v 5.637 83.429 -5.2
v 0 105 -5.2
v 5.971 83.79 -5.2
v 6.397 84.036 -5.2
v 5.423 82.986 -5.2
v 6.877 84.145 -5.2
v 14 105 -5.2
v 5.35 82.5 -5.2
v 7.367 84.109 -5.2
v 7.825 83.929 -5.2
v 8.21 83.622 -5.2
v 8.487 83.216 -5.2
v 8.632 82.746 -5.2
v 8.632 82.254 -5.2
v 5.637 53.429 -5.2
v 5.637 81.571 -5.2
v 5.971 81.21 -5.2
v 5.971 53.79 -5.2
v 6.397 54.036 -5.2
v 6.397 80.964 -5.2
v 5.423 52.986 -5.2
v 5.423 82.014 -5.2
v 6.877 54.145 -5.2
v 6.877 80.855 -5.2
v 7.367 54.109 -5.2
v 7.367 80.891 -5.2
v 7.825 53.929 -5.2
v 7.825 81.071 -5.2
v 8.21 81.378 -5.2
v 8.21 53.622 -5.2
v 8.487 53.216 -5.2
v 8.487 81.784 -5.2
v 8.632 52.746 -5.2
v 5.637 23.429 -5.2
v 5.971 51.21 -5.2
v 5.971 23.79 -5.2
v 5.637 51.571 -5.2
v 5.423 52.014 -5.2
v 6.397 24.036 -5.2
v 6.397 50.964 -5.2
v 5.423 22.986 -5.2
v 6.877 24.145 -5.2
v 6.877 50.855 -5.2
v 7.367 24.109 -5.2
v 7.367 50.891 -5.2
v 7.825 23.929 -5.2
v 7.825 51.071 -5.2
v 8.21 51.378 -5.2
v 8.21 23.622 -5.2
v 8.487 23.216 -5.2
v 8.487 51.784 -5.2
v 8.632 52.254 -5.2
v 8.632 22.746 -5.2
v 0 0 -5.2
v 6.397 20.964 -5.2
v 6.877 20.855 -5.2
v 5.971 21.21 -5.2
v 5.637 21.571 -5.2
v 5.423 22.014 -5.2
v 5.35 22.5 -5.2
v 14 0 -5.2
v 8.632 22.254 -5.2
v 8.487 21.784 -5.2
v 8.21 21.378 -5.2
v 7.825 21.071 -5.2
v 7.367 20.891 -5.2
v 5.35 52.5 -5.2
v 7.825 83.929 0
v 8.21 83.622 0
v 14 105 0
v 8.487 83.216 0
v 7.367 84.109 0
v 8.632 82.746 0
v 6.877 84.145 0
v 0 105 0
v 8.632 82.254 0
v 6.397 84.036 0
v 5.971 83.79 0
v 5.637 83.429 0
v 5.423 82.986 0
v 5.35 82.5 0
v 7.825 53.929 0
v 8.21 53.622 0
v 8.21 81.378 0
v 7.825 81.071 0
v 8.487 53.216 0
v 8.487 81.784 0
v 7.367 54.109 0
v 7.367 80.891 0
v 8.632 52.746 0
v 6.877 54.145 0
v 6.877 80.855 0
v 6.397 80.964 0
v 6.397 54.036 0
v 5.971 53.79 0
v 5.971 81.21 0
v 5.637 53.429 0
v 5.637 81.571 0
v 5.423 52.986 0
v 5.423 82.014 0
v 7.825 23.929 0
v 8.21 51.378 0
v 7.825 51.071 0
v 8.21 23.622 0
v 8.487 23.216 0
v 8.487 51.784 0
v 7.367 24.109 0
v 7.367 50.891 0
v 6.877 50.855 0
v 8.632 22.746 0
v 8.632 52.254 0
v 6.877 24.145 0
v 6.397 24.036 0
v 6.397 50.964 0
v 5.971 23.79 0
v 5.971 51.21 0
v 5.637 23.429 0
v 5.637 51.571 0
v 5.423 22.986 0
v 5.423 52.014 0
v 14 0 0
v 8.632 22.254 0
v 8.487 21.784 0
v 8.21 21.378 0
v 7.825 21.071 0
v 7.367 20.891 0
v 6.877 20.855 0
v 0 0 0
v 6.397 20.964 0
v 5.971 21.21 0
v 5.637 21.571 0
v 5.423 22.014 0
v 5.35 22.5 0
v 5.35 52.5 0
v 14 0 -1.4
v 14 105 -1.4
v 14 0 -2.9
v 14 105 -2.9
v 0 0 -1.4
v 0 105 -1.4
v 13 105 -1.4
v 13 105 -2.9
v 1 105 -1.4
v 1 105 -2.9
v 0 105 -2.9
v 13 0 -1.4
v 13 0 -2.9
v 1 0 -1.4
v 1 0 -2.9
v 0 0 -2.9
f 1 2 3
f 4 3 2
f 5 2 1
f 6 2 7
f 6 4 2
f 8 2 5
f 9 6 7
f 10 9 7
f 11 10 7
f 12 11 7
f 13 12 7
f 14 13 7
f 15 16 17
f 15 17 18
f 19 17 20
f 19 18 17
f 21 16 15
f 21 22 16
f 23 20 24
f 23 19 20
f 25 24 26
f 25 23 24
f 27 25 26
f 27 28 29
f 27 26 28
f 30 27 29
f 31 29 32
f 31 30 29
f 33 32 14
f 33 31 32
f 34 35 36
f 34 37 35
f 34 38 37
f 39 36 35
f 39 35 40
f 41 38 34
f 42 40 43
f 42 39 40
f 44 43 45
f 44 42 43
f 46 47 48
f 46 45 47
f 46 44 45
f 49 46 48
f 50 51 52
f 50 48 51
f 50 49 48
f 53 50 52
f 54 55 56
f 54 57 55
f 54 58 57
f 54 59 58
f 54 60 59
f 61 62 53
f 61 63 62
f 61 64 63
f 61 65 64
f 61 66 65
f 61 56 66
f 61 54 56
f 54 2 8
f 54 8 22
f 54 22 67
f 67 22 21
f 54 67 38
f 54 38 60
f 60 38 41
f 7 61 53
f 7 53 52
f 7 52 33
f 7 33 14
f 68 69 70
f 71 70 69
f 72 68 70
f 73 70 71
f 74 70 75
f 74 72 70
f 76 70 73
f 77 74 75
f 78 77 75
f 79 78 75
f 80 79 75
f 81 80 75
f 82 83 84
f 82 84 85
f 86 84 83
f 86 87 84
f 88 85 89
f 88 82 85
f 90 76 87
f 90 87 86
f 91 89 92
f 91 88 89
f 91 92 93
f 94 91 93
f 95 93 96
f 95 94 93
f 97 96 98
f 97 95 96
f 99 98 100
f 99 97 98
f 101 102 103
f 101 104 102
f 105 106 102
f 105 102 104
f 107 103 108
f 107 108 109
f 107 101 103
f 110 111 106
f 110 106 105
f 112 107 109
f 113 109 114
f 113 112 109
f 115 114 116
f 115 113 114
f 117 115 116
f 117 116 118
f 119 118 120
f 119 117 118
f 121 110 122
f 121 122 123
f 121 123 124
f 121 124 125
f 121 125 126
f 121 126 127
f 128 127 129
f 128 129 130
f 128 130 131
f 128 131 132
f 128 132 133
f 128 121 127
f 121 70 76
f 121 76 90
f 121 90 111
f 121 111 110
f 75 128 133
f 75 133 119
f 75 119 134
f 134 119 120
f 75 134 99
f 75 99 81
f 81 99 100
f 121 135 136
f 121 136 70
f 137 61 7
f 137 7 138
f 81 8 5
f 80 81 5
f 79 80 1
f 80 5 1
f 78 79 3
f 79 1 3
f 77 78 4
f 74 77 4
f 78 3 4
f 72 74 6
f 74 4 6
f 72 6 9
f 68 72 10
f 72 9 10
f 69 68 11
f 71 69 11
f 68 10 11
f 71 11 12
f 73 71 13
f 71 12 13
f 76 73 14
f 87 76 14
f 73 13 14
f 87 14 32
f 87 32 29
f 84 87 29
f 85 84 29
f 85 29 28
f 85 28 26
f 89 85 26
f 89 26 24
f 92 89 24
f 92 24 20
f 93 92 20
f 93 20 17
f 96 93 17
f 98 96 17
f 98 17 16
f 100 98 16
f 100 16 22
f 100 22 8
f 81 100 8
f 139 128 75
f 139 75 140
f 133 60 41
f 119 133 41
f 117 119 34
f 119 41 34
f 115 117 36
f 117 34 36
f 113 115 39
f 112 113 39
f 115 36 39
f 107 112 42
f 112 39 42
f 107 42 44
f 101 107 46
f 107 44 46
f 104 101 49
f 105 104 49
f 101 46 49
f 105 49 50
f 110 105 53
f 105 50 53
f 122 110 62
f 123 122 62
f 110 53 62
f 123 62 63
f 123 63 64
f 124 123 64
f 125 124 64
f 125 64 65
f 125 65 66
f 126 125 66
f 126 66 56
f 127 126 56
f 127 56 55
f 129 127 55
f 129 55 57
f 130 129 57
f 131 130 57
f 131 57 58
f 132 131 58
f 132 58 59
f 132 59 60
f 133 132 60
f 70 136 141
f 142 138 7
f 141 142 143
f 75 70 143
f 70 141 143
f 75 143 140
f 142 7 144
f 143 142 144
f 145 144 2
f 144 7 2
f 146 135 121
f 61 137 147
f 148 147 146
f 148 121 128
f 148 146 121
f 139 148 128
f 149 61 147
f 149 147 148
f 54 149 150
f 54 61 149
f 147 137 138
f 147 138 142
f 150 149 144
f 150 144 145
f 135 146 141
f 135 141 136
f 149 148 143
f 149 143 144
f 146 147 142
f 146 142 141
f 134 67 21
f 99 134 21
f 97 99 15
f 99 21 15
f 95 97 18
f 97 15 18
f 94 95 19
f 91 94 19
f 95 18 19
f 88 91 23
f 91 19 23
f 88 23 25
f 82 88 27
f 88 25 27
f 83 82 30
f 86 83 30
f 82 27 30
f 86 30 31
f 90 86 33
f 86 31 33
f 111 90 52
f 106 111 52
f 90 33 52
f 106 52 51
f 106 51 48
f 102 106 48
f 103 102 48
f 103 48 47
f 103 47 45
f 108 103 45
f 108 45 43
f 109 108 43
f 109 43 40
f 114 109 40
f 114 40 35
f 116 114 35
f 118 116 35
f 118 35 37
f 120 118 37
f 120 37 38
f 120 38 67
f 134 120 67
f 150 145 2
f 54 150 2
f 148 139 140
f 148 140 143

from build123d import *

# Parameters (mm, degrees)
EXTRUDE_1_DEPTH     = 105
SKETCH_2_R          = 1.65
CUT_EXTRUDE_1_DEPTH = 107.056777247


with BuildPart() as part:
    # 草图1 → 凸台-拉伸1 (new body)
    with BuildSketch(Plane(origin=(0, 0, 0), x_dir=(1, 0, 0), z_dir=(0, 1, 0))):
        Polygon((0, 0), (0, 1.4), (1, 1.4), (1, 2.9), (0, 2.9), (0, 5.2), (14, 5.2), (14, 2.9), (13, 2.9), (13, 1.4), (14, 1.4), (14, 0), align=None)
    extrude(amount=EXTRUDE_1_DEPTH)

    # 草图2 → 切除-拉伸1 (cut, through all)
    with BuildSketch(Plane(origin=(0, 0, -5.2), x_dir=(-1, 0, 0), z_dir=(0, 0, -1))):
        with Locations((-7, 52.5)):
            Circle(SKETCH_2_R)
        with Locations((-7, 82.5)):
            Circle(SKETCH_2_R)
        with Locations((-7, 22.5)):
            Circle(SKETCH_2_R)
    extrude(amount=-CUT_EXTRUDE_1_DEPTH, mode=Mode.SUBTRACT)


solid = part.part
